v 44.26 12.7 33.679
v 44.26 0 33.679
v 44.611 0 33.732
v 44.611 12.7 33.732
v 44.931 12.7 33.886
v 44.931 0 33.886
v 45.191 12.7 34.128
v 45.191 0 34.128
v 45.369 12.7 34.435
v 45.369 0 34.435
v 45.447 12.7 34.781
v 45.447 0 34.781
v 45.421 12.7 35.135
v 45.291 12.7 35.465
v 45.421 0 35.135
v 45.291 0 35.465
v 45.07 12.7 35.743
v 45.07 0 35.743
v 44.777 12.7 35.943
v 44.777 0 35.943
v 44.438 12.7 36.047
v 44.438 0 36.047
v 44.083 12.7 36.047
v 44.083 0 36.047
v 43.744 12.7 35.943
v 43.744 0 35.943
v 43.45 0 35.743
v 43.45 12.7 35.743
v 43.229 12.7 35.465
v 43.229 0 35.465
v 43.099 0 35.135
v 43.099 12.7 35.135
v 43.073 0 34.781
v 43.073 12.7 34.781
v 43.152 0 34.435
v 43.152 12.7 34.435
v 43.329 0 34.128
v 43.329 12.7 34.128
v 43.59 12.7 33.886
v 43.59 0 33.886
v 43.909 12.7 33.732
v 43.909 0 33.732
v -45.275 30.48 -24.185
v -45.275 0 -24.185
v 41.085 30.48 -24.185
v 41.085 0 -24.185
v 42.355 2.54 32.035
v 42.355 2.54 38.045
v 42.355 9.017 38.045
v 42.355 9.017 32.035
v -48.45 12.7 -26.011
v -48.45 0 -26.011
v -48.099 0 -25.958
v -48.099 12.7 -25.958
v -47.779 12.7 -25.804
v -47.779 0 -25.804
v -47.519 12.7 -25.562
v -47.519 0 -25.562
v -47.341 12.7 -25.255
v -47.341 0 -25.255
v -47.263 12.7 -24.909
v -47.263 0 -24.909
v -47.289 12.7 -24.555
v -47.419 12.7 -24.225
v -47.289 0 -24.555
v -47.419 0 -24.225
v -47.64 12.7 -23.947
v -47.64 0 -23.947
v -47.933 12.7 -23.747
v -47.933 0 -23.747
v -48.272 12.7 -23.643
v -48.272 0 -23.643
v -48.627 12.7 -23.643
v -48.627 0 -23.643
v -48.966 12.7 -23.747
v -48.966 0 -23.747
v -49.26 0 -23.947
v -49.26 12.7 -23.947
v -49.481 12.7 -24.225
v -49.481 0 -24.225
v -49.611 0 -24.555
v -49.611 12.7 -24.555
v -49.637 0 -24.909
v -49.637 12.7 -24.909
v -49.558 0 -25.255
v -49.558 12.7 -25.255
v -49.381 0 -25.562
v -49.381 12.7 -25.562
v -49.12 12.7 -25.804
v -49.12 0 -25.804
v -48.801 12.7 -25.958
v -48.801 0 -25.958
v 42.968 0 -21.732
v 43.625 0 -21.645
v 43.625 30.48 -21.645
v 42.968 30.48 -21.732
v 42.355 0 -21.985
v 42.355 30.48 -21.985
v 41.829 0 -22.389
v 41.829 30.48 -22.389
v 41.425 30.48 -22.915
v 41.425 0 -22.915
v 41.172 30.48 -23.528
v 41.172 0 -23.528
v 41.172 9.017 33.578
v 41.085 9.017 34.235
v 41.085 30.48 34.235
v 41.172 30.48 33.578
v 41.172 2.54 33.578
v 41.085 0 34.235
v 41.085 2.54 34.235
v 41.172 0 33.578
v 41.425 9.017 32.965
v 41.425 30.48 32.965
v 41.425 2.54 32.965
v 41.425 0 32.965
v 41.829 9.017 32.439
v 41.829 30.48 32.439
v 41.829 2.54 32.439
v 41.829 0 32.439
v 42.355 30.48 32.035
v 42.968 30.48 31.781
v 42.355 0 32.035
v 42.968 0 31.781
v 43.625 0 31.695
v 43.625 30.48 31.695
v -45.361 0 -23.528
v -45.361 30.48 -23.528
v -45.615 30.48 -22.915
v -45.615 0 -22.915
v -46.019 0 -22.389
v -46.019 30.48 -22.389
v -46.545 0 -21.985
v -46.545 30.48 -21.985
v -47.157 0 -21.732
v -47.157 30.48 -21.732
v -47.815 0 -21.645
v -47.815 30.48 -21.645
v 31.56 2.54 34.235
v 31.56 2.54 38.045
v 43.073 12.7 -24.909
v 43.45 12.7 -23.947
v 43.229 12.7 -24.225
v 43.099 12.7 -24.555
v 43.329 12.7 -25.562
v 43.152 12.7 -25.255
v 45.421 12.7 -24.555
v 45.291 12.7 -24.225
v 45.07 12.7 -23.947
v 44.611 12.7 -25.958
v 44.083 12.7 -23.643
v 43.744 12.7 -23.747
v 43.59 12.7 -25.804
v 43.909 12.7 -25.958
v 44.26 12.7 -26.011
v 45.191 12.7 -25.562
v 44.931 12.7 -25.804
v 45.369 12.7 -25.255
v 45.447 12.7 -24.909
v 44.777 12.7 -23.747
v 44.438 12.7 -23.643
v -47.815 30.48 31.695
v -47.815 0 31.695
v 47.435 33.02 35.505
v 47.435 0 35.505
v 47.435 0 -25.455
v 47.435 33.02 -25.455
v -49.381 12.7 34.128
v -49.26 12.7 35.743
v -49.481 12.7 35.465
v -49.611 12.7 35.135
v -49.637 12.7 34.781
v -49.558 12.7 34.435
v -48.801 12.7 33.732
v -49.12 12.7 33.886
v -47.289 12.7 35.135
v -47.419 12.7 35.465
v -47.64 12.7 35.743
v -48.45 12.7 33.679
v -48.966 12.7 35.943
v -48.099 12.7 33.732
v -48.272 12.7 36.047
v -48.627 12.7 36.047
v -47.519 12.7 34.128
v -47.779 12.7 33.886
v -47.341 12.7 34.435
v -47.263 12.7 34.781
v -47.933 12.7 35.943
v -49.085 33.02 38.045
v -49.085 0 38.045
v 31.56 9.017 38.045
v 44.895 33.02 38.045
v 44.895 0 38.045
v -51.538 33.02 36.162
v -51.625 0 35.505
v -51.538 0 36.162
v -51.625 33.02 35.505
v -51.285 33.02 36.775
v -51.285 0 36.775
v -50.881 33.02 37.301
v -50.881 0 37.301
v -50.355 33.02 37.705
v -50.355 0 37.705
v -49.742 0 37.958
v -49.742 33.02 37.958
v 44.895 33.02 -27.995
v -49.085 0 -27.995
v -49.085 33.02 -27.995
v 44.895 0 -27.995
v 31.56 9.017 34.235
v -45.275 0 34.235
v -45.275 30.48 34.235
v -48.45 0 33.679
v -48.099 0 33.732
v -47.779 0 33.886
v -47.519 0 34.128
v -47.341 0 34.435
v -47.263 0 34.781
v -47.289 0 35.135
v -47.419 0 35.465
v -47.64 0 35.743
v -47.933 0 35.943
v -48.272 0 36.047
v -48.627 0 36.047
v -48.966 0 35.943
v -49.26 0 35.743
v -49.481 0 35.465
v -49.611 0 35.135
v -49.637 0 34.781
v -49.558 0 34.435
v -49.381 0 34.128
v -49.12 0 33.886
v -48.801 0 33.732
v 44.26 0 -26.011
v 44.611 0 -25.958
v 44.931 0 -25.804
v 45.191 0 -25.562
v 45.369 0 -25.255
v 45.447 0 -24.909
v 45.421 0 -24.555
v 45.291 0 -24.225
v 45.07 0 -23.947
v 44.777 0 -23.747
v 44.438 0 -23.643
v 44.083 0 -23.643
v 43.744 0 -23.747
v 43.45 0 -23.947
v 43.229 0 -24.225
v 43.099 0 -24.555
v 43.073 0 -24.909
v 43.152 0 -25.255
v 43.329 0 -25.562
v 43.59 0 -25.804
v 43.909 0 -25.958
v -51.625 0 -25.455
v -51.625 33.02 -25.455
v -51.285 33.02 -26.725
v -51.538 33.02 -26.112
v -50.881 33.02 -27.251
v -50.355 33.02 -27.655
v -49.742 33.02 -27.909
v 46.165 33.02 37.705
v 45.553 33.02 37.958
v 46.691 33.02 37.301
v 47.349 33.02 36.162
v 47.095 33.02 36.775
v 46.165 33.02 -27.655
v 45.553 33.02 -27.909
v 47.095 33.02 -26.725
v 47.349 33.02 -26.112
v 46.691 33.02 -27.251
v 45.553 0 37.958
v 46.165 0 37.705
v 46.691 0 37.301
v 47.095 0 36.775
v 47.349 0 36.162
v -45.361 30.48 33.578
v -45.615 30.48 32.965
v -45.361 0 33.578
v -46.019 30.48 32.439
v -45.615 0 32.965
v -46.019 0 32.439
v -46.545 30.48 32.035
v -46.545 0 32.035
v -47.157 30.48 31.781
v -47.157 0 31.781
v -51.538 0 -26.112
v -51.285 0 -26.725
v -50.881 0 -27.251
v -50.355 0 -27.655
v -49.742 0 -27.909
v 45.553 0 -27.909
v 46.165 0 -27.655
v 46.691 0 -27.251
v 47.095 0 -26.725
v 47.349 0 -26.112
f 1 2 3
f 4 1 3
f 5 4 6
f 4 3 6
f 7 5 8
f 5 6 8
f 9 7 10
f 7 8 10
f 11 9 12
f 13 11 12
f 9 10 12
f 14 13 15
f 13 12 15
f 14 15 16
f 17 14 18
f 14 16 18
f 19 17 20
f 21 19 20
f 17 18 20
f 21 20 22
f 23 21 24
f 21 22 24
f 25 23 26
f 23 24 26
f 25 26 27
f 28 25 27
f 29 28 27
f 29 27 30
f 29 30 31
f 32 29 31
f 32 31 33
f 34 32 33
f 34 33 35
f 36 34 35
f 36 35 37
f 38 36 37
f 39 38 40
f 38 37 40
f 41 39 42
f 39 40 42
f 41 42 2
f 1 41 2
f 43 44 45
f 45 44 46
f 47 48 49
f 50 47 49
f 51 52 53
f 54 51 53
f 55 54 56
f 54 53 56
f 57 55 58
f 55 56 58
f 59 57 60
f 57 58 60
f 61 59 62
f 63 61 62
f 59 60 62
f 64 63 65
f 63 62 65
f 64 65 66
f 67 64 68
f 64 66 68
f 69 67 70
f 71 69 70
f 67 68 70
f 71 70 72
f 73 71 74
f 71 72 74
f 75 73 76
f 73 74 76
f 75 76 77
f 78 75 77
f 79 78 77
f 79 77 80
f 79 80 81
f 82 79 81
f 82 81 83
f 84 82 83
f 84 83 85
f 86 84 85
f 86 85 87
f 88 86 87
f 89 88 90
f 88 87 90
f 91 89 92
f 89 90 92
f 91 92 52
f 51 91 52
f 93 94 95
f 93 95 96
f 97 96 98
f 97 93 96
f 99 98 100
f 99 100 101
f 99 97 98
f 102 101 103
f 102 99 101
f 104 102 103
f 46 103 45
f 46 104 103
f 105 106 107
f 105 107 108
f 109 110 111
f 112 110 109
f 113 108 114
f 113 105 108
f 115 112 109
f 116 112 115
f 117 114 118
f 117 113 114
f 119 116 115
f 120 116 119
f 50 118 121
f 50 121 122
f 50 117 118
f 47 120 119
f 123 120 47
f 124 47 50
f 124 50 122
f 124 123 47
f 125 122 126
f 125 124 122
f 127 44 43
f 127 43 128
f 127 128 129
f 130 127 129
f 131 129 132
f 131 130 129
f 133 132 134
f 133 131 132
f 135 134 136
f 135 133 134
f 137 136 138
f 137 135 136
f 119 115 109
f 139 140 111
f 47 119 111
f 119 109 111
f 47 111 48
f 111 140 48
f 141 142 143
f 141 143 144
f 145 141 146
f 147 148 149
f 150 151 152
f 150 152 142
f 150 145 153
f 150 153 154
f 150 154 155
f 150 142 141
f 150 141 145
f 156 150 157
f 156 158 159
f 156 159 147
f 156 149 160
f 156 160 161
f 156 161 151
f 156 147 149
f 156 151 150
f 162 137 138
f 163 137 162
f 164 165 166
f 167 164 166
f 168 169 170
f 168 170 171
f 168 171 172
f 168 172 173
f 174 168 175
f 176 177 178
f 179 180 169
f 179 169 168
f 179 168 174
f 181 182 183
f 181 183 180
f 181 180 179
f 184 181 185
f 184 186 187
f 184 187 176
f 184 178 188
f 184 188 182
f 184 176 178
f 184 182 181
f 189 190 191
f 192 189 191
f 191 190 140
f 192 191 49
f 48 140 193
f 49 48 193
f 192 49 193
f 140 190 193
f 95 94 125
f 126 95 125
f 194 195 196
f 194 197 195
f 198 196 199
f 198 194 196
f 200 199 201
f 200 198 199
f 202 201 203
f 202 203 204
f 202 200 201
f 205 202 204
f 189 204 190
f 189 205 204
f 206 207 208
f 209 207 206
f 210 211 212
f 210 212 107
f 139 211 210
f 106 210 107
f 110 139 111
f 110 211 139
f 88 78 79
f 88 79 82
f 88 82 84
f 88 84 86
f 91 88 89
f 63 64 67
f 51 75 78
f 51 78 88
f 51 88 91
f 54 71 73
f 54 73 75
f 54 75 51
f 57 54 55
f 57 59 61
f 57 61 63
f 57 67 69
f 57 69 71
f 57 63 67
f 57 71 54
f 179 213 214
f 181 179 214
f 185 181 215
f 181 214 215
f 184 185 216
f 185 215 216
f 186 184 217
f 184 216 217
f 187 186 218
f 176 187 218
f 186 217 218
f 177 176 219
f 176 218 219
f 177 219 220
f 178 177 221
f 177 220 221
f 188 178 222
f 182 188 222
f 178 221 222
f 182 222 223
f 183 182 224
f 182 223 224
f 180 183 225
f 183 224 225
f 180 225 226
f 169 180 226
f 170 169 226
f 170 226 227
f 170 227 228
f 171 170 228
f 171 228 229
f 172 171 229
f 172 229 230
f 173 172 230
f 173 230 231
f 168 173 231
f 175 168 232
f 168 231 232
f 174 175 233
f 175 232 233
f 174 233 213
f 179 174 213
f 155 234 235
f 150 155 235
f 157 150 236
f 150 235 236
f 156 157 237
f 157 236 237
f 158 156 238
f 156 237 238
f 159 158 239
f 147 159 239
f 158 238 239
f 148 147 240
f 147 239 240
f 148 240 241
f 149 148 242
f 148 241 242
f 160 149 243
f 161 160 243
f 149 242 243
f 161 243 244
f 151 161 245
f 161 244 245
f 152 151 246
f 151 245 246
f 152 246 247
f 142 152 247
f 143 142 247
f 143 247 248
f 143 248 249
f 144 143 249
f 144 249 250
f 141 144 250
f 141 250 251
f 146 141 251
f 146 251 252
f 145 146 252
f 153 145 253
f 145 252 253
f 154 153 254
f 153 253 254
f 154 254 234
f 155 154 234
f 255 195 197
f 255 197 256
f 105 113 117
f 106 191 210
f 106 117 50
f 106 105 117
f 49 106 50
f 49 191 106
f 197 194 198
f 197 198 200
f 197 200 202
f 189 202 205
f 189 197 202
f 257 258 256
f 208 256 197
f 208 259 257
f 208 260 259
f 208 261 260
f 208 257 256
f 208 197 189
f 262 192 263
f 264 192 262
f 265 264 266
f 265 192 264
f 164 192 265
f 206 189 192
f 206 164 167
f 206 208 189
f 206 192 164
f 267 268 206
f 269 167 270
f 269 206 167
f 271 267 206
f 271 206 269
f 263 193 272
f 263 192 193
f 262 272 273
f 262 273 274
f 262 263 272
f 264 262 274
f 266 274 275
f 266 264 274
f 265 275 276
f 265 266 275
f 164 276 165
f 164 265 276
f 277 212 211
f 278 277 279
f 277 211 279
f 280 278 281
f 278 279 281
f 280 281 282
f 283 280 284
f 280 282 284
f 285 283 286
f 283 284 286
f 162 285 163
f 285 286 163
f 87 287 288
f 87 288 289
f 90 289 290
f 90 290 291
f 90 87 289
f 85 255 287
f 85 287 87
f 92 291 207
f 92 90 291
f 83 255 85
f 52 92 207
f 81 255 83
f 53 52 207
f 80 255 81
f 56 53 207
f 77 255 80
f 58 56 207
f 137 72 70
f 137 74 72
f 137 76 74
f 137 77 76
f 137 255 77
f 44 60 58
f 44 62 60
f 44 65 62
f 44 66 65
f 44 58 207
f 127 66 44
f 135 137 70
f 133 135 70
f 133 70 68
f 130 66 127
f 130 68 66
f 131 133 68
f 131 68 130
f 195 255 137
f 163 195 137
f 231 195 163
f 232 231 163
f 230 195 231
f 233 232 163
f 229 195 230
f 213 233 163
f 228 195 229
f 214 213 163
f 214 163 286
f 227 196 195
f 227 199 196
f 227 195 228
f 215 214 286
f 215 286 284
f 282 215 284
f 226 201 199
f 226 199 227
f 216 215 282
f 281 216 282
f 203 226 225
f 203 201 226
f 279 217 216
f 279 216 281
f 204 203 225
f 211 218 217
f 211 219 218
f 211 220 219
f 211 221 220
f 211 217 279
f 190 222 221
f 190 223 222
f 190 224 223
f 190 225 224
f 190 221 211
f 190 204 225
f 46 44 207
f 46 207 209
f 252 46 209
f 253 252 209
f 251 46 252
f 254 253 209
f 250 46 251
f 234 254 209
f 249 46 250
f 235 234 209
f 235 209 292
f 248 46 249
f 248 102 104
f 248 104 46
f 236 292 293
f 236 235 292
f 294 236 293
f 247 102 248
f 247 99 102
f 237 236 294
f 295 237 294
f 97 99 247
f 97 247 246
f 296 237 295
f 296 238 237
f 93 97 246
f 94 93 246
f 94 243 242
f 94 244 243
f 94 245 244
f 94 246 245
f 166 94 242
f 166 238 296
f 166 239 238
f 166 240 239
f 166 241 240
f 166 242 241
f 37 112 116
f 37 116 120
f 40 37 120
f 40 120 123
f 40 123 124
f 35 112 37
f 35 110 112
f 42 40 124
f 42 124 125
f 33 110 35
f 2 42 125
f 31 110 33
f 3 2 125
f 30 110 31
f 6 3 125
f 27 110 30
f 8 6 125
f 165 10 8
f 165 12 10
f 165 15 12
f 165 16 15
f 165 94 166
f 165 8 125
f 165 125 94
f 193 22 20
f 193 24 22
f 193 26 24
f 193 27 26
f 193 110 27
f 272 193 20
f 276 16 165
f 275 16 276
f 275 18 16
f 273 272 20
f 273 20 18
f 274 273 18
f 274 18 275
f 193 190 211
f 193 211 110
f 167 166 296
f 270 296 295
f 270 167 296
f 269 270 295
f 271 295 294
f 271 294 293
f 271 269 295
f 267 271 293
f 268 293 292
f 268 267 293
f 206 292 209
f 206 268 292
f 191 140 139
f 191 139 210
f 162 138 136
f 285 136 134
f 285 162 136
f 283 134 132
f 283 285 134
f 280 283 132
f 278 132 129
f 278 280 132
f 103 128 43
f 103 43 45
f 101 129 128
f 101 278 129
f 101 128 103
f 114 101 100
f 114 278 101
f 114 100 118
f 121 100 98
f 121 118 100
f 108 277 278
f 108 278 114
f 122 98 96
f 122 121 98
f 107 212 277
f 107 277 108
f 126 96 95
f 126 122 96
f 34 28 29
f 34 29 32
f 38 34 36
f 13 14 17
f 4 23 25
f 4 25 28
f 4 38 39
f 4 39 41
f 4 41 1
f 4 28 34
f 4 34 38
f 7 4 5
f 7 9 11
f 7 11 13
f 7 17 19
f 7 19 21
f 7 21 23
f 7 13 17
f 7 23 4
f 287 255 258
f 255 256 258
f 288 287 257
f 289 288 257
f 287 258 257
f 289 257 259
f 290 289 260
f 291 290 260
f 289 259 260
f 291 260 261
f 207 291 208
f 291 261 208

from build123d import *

# Parameters (mm, degrees)
SKETCH1_W           = 99.06
SKETCH1_H           = 66.04
BOSS_EXTRUDE1_DEPTH = 33.02
FILLET1_R           = 2.54
SKETCH3_W           = 91.44
SKETCH3_H           = 58.42
CUT_EXTRUDE1_DEPTH  = 30.48
BOSS_EXTRUDE2_REACH = 74.131
SKETCH4_R           = 1.190625
CUT_EXTRUDE5_DEPTH  = 12.7
CUT_EXTRUDE4_REACH  = 92.093
SKETCH6_W           = 10.795
SKETCH6_H           = 6.477


with BuildPart() as part:
    # Sketch1 → Boss-Extrude1 (new body)
    with BuildSketch(Plane(origin=(0, 0, 0), x_dir=(1, 0, 0), z_dir=(0, 1, 0))):
        with Locations((-2.094797048, -5.024935424)):
            Rectangle(SKETCH1_W, SKETCH1_H)
    extrude(amount=BOSS_EXTRUDE1_DEPTH)

    # Fillet1
    fillet1_edges = [part.edges().sort_by_distance(p)[0] for p in [
        (-51.624797048, 16.51, -27.995064576),
        (47.435202952, 16.51, -27.995064576),
        (47.435202952, 16.51, 38.044935424),
        (-51.624797048, 16.51, 38.044935424),
    ]]
    fillet(fillet1_edges, radius=FILLET1_R)

    # Sketch3 → Cut-Extrude1 (cut)
    with BuildSketch(Plane.XZ):
        with Locations((-2.094797048, 5.024935424)):
            Rectangle(SKETCH3_W, SKETCH3_H)
    extrude(amount=-CUT_EXTRUDE1_DEPTH, mode=Mode.SUBTRACT)

    # Sketch7 → Boss-Extrude2 (add, up to next)
    with BuildSketch(Plane.XZ, mode=Mode.PRIVATE) as boss_extrude2_sk1:
        with BuildLine():
            Line((43.625202952, 34.234935424), (41.085202952, 34.234935424))
            ThreePointArc((41.085202952, 34.234935424), (41.829151728, 32.4388842), (43.625202952, 31.694935424))
            Line((43.625202952, 31.694935424), (43.625202952, 34.234935424))
        make_face()
    boss_extrude2_tool1 = extrude(boss_extrude2_sk1.sketch, amount=-BOSS_EXTRUDE2_REACH, mode=Mode.PRIVATE) - part.part
    # Sketch7 → Boss-Extrude2 (add, up to next)
    with BuildSketch(Plane.XZ, mode=Mode.PRIVATE) as boss_extrude2_sk2:
        with BuildLine():
            Line((-47.814797048, 34.234935424), (-45.274797048, 34.234935424))
            ThreePointArc((-45.274797048, 34.234935424), (-46.018745824, 32.4388842), (-47.814797048, 31.694935424))
            Line((-47.814797048, 31.694935424), (-47.814797048, 34.234935424))
        make_face()
    boss_extrude2_tool2 = extrude(boss_extrude2_sk2.sketch, amount=-BOSS_EXTRUDE2_REACH, mode=Mode.PRIVATE) - part.part
    # Sketch7 → Boss-Extrude2 (add, up to next)
    with BuildSketch(Plane.XZ, mode=Mode.PRIVATE) as boss_extrude2_sk3:
        with BuildLine():
            Line((-47.814797048, -21.645064576), (-47.814797048, -24.185064576))
            Line((-47.814797048, -24.185064576), (-45.274797048, -24.185064576))
            ThreePointArc((-45.274797048, -24.185064576), (-46.018745824, -22.389013351), (-47.814797048, -21.645064576))
        make_face()
    boss_extrude2_tool3 = extrude(boss_extrude2_sk3.sketch, amount=-BOSS_EXTRUDE2_REACH, mode=Mode.PRIVATE) - part.part
    # Sketch7 → Boss-Extrude2 (add, up to next)
    with BuildSketch(Plane.XZ, mode=Mode.PRIVATE) as boss_extrude2_sk4:
        with BuildLine():
            Line((41.085202952, -24.185064576), (43.625202952, -24.185064576))
            Line((43.625202952, -24.185064576), (43.625202952, -21.645064576))
            ThreePointArc((43.625202952, -21.645064576), (41.829151728, -22.389013351), (41.085202952, -24.185064576))
        make_face()
    boss_extrude2_tool4 = extrude(boss_extrude2_sk4.sketch, amount=-BOSS_EXTRUDE2_REACH, mode=Mode.PRIVATE) - part.part
    add(boss_extrude2_tool1.solids().sort_by_distance((42.547193, 0, 33.156926))[0])
    add(boss_extrude2_tool2.solids().sort_by_distance((-46.736788, 0, 33.156926))[0])
    add(boss_extrude2_tool3.solids().sort_by_distance((-46.736788, 0, -23.107055))[0])
    add(boss_extrude2_tool4.solids().sort_by_distance((42.547193, 0, -23.107055))[0])

    # Sketch4 → Cut-Extrude5 (cut)
    with BuildSketch(Plane.XZ):
        with Locations(Location((44.260202952, 34.869935424, 0), (0, 0, 270))):
            Circle(SKETCH4_R)
        with Locations(Location((44.260202952, -24.820064576, 0), (0, 0, 270))):
            Circle(SKETCH4_R)
        with Locations(Location((-48.449797048, 34.869935424, 0), (0, 0, 270))):
            Circle(SKETCH4_R)
        with Locations(Location((-48.449797048, -24.820064576, 0), (0, 0, 270))):
            Circle(SKETCH4_R)
    extrude(amount=-CUT_EXTRUDE5_DEPTH, mode=Mode.SUBTRACT)

    # Sketch6 → Cut-Extrude4 (cut, up to next)
    with BuildSketch(Plane.XY.offset(38.044935424), mode=Mode.PRIVATE) as cut_extrude4_sk1:
        with Locations((36.957702952, 5.7785)):
            Rectangle(SKETCH6_W, SKETCH6_H)
    cut_extrude4_tool1 = extrude(cut_extrude4_sk1.sketch, amount=-CUT_EXTRUDE4_REACH, mode=Mode.PRIVATE) & part.part
    add(cut_extrude4_tool1.solids().sort_by_distance((36.957703, 5.7785, 38.044935))[0], mode=Mode.SUBTRACT)


solid = part.part
